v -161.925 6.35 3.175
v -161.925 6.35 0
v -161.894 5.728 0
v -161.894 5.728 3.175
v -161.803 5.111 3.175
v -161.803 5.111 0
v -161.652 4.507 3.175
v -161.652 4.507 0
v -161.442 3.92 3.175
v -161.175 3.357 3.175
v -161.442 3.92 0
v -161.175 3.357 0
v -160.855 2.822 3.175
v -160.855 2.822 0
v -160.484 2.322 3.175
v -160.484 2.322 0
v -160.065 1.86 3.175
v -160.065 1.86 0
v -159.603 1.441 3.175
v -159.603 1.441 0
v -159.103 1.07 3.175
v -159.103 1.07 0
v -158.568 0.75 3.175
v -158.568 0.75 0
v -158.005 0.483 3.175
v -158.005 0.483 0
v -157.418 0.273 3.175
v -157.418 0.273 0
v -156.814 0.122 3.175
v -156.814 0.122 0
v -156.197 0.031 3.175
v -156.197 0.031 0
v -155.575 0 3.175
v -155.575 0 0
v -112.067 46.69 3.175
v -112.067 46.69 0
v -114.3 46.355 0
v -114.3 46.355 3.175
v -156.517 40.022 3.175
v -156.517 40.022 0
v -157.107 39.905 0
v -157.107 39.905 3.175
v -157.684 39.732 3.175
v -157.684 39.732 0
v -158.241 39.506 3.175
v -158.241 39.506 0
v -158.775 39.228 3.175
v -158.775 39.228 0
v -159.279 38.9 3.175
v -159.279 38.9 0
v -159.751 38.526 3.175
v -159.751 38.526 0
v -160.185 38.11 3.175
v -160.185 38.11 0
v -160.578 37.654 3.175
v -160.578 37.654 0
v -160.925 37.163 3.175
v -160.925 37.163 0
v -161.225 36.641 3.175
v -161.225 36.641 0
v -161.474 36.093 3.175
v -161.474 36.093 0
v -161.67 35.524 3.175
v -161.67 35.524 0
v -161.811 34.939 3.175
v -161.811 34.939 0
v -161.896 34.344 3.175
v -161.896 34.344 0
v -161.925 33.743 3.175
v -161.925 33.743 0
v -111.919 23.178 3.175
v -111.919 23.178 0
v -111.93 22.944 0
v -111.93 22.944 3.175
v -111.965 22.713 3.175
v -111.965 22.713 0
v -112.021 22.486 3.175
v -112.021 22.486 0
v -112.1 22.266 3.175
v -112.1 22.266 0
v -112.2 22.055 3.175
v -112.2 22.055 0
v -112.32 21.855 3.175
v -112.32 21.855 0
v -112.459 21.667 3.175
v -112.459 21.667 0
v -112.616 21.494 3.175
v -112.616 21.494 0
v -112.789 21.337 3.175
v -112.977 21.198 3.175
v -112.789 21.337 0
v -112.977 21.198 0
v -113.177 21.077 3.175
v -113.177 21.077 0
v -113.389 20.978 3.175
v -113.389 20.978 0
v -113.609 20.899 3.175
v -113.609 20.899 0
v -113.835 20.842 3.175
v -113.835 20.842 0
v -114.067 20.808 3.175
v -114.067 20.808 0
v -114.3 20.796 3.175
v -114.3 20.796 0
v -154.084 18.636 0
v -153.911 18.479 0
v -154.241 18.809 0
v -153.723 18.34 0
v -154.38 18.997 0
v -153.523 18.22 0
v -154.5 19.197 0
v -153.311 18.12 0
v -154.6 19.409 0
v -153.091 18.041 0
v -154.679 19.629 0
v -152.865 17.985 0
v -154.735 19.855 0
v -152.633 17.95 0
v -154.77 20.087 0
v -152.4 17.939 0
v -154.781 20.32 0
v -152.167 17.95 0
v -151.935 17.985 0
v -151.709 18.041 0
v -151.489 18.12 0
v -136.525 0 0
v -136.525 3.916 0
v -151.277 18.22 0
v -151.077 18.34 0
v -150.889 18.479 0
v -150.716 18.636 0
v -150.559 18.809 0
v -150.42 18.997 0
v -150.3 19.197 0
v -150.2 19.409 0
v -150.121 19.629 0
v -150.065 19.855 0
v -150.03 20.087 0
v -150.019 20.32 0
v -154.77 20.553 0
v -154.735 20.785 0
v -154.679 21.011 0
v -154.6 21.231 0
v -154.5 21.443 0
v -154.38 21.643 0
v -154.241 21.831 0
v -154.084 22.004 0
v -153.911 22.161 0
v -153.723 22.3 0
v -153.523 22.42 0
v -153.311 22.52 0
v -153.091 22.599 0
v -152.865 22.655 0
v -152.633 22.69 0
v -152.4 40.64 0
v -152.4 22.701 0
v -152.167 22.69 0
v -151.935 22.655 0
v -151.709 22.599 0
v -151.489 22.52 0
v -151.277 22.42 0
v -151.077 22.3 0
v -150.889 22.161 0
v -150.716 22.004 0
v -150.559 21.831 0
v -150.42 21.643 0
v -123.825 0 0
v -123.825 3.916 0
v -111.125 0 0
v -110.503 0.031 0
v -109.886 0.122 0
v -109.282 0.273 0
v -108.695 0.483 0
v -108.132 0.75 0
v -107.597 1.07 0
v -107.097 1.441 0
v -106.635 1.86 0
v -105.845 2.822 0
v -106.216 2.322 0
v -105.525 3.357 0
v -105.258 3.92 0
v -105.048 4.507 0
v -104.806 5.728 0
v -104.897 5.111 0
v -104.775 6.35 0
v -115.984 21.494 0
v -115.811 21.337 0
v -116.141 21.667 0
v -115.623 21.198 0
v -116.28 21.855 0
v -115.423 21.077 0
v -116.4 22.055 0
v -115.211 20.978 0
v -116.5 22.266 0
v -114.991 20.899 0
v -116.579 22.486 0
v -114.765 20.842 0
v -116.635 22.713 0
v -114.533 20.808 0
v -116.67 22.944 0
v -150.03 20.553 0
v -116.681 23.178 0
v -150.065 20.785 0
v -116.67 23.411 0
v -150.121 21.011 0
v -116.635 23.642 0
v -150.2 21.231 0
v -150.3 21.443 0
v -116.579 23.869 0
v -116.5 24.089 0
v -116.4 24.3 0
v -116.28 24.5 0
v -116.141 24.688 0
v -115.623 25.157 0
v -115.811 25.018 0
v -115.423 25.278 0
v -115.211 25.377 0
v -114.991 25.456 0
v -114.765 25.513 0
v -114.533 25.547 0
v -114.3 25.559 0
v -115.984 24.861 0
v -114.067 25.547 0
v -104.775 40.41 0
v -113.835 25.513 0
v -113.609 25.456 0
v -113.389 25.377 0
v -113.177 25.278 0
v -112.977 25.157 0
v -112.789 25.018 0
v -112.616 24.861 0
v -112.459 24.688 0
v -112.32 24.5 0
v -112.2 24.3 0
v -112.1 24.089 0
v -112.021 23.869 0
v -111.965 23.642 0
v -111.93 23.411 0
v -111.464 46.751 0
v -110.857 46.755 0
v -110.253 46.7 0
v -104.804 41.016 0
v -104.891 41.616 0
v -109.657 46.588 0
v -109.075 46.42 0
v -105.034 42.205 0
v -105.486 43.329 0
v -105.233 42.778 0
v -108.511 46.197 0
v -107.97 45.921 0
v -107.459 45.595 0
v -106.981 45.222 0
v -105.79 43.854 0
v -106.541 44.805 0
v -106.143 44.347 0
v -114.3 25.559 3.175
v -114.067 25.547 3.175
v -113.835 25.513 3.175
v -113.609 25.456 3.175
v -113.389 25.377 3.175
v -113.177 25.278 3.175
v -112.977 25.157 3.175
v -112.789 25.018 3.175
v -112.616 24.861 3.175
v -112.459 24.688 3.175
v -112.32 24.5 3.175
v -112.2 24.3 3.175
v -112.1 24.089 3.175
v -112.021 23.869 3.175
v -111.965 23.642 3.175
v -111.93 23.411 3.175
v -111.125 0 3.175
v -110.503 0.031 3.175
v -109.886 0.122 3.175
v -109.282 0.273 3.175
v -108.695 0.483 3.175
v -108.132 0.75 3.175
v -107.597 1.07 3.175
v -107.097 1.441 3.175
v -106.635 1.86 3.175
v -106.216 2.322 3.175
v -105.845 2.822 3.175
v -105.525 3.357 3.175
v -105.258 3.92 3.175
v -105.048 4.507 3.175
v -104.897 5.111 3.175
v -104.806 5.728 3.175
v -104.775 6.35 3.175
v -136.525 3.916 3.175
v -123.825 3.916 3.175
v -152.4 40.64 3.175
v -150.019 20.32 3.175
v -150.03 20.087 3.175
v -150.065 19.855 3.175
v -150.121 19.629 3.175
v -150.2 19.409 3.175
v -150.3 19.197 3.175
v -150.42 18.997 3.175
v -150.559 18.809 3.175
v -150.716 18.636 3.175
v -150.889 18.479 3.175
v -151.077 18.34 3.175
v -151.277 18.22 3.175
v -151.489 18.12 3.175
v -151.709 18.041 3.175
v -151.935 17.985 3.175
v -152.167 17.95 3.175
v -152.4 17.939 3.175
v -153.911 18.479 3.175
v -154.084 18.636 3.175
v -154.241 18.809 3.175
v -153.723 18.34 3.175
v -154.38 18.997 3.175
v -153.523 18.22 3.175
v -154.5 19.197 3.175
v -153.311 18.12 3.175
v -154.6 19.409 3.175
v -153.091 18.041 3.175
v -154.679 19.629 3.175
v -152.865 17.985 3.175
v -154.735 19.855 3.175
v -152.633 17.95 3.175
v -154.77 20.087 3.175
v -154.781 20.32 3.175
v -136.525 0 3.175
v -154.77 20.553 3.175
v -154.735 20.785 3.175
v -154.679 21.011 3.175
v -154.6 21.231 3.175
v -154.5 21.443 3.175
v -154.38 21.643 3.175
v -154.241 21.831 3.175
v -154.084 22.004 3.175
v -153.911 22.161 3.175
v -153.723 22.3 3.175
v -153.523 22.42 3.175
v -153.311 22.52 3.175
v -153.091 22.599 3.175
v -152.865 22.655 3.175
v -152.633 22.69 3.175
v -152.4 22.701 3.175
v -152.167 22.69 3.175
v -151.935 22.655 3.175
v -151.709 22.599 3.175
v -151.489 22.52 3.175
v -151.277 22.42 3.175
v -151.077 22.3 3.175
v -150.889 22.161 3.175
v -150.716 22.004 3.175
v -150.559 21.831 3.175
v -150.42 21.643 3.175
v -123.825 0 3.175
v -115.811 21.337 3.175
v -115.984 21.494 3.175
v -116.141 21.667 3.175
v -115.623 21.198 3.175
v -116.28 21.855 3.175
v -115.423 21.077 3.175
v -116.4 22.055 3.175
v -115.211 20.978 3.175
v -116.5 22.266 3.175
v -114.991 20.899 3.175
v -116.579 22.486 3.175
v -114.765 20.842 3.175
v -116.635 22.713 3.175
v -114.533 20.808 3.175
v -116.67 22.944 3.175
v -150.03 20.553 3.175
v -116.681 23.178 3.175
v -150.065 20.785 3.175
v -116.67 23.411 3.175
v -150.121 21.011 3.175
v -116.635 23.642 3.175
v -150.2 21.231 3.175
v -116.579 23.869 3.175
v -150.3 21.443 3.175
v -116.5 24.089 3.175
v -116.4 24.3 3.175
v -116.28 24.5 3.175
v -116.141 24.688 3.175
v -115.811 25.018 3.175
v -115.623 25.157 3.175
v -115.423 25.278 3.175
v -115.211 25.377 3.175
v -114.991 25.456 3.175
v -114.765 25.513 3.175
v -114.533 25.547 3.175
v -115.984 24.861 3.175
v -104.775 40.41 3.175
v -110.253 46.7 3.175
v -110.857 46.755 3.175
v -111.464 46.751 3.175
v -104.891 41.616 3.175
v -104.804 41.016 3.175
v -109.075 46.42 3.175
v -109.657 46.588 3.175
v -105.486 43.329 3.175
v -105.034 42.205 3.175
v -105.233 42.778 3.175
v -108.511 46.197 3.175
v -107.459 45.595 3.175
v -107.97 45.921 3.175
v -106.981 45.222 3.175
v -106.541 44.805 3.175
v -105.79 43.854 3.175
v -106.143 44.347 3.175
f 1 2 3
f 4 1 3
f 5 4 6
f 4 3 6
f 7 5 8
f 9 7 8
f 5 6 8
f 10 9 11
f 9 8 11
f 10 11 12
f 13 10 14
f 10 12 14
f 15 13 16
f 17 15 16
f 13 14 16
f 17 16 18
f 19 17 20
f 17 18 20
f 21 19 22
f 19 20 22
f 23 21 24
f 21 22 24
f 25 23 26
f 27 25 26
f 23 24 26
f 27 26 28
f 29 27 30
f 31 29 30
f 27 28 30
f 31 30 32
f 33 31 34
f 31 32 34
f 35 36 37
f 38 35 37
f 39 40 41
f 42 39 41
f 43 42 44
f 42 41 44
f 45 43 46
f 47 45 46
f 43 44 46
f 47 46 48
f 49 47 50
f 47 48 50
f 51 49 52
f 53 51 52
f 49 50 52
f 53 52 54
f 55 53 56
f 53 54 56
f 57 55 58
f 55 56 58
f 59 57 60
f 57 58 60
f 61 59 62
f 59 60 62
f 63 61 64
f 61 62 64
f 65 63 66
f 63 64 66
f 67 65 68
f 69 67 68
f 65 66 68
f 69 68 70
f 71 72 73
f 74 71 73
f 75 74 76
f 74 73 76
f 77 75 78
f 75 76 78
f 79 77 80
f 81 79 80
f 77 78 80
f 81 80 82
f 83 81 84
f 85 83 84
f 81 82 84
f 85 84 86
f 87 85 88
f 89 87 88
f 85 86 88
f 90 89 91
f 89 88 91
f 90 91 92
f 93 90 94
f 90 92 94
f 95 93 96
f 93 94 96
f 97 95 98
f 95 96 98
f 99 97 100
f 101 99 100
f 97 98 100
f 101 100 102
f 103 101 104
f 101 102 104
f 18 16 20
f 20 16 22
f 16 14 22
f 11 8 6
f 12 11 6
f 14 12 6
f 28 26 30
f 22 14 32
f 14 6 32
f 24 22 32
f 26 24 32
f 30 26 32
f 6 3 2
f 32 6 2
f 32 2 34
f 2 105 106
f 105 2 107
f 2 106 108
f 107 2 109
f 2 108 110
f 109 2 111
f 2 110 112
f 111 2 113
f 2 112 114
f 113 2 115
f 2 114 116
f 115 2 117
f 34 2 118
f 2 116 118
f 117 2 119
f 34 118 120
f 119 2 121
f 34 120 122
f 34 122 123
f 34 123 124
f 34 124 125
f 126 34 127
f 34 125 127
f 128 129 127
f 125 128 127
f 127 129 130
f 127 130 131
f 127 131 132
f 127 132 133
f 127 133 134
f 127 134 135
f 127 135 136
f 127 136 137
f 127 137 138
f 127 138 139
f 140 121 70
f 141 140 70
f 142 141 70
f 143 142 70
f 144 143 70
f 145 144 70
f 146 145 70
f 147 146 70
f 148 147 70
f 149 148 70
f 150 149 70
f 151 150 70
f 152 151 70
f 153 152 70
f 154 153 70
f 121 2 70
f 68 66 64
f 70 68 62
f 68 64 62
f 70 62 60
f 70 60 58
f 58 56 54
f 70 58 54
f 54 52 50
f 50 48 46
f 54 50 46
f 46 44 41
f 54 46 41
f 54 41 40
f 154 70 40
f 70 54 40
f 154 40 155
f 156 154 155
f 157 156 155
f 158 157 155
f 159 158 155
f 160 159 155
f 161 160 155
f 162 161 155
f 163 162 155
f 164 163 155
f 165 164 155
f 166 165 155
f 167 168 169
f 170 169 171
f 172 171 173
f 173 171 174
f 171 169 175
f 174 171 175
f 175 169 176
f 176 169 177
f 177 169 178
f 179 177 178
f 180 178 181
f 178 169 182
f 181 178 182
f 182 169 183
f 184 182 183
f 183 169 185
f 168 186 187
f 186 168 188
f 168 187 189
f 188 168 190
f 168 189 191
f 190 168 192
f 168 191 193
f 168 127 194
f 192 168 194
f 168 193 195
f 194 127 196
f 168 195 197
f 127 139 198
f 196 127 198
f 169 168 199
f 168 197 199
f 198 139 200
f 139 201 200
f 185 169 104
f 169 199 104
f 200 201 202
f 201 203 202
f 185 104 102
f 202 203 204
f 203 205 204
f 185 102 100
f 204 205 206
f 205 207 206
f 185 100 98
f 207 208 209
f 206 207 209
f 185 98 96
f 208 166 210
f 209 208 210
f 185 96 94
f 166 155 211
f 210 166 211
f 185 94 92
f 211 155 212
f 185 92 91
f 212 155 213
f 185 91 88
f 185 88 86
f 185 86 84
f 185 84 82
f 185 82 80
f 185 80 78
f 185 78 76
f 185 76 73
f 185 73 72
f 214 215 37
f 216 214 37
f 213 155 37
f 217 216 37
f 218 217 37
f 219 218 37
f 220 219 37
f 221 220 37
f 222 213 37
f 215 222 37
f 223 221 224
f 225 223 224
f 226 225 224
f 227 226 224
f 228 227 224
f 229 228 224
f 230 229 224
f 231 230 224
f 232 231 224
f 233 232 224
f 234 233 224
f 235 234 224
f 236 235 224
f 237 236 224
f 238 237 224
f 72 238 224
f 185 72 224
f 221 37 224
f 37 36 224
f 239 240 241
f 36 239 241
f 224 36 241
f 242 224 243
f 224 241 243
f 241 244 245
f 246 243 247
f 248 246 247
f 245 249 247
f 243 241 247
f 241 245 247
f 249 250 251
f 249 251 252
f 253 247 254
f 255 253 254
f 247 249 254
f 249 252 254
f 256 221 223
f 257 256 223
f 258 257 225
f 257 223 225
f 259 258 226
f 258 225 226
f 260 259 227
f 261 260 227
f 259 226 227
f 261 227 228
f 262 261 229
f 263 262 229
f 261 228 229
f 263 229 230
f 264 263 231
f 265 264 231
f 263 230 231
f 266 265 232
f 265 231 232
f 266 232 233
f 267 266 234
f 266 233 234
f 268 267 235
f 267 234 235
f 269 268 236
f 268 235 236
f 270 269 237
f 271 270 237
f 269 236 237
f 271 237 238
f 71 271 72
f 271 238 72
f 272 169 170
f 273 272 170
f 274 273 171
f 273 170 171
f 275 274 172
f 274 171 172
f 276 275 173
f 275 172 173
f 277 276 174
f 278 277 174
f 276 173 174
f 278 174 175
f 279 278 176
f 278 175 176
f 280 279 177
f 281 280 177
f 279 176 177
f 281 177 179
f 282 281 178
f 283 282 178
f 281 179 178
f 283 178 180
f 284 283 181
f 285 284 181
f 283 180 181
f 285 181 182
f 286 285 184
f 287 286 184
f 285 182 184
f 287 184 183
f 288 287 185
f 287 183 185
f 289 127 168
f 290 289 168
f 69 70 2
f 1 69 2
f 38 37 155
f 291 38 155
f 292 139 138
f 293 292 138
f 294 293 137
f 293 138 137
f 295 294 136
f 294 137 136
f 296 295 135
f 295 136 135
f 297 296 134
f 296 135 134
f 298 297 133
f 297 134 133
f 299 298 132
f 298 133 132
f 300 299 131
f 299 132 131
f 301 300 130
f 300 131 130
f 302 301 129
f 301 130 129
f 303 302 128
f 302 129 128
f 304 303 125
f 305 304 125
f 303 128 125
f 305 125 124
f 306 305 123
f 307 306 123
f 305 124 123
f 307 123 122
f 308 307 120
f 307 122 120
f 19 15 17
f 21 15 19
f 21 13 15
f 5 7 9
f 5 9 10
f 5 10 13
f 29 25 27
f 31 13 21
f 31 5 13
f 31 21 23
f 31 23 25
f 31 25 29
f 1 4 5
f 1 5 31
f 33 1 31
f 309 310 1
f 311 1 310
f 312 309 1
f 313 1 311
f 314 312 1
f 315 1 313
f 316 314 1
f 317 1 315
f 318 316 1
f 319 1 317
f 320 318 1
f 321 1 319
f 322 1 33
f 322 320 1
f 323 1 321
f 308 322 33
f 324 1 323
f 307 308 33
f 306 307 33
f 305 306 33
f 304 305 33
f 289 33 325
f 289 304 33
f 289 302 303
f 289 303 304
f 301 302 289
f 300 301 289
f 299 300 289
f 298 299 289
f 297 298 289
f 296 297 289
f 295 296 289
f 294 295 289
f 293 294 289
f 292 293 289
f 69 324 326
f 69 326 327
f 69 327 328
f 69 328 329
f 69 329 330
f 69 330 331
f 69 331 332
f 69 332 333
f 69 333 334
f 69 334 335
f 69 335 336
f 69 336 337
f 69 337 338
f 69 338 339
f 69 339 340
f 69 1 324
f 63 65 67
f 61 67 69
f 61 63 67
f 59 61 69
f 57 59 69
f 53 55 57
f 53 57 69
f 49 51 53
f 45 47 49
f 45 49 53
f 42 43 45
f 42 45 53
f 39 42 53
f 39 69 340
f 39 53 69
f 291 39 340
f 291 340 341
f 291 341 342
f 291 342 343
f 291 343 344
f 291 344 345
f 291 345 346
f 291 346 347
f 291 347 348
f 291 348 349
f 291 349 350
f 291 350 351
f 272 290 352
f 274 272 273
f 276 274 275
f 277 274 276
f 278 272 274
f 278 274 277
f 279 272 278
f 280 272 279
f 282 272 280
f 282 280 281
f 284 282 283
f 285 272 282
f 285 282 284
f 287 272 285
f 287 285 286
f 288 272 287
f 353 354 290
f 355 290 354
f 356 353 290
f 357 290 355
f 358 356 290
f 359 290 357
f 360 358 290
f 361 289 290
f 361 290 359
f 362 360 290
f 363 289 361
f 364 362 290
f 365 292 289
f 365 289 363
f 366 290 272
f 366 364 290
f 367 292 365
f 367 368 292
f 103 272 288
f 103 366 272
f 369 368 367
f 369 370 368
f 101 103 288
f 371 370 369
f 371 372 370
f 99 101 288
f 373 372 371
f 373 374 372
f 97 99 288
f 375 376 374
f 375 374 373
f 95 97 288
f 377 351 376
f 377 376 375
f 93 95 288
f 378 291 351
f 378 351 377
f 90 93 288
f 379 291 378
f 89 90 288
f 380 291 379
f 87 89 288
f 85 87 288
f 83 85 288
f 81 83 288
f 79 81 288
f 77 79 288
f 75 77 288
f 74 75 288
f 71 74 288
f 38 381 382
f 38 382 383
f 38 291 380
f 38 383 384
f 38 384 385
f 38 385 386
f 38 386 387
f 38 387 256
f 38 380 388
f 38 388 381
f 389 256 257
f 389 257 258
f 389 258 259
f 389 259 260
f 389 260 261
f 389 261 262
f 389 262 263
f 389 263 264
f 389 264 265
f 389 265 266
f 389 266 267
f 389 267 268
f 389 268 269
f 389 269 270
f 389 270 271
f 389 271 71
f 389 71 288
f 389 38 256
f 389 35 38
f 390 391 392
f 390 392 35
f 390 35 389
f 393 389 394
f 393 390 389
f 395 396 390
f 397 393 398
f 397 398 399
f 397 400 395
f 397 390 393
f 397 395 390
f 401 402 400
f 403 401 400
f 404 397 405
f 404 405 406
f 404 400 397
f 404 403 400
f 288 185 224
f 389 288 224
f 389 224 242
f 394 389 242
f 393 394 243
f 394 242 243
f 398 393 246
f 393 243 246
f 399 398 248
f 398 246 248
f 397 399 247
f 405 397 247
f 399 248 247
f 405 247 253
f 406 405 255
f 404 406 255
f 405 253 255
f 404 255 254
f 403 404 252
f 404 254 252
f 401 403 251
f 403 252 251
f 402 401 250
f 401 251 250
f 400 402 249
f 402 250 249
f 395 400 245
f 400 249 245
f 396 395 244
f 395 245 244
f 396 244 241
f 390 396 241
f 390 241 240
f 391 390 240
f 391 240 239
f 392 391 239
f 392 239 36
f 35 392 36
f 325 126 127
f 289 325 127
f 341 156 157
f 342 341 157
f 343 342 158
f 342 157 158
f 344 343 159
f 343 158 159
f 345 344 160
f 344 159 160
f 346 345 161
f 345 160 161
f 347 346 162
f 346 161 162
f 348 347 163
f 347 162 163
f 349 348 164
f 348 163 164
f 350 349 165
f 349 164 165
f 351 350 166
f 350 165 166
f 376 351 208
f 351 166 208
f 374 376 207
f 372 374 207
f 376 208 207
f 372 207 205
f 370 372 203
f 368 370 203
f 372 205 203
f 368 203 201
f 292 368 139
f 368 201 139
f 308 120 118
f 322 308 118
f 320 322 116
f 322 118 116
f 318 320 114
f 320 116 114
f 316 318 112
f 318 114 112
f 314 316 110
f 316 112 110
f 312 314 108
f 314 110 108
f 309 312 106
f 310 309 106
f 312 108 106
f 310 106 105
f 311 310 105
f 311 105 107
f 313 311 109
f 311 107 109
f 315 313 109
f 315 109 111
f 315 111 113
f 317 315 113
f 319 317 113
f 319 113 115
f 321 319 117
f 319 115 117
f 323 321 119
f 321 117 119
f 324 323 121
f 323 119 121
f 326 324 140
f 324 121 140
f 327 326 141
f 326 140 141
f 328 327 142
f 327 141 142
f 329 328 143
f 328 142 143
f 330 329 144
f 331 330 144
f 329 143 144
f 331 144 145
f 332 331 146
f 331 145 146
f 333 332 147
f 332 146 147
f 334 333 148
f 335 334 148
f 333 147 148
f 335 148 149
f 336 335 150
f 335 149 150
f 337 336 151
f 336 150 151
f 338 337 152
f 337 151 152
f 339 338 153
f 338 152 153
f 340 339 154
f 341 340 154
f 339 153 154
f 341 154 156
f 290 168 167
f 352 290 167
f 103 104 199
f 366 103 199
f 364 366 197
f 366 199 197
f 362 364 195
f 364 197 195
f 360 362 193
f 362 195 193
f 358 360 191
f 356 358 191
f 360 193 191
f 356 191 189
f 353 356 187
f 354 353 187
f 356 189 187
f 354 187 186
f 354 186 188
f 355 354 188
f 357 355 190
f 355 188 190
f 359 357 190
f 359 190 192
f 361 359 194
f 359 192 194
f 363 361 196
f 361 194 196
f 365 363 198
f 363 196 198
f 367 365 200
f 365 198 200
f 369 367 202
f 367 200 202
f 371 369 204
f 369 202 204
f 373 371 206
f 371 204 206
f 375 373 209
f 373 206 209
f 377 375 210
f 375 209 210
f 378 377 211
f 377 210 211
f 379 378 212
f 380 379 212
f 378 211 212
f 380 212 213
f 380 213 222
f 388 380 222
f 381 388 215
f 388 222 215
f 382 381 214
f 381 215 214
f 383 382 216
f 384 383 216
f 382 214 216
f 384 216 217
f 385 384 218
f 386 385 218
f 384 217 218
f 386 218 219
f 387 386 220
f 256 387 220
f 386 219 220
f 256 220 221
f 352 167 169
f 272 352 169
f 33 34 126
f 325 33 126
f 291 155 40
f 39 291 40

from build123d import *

# Parameters (mm, degrees)
BOSS_EXTRUDE1_DEPTH = 3.175


with BuildPart() as part:
    # Sketch1 → Boss-Extrude1 (new body)
    with BuildSketch(Plane.XY):
        with BuildLine():
            Line((-152.4, 22.70125), (-152.4, 40.64))
            Line((-152.4, 40.64), (-156.516961876, 40.022455719))
            ThreePointArc((-156.516961876, 40.022455719), (-160.386650336, 37.886442621), (-161.925, 33.742709878))
            Line((-161.925, 33.742709878), (-161.925, 6.35))
            ThreePointArc((-161.925, 6.35), (-160.065128061, 1.859871939), (-155.575, 0))
            Line((-155.575, 0), (-152.4, 0))
            Line((-152.4, 0), (-152.4, 17.93875))
            ThreePointArc((-152.4, 17.93875), (-154.78125, 20.32), (-152.4, 22.70125))
        make_face()
        with BuildLine():
            Line((-123.825, 0), (-114.3, 0))
            Line((-114.3, 0), (-114.3, 20.79625))
            ThreePointArc((-114.3, 20.79625), (-116.68125, 23.1775), (-114.3, 25.55875))
            Line((-114.3, 25.55875), (-114.3, 46.355))
            Line((-114.3, 46.355), (-152.4, 40.64))
            Line((-152.4, 40.64), (-152.4, 22.70125))
            ThreePointArc((-152.4, 22.70125), (-150.716201977, 22.003798023), (-150.01875, 20.32))
            ThreePointArc((-150.01875, 20.32), (-150.716201977, 18.636201977), (-152.4, 17.93875))
            Line((-152.4, 17.93875), (-152.4, 0))
            Line((-152.4, 0), (-136.525, 0))
            Line((-136.525, 0), (-136.525, 3.915859715))
            Line((-136.525, 3.915859715), (-123.825, 3.915859715))
            Line((-123.825, 3.915859715), (-123.825, 0))
        make_face()
        with BuildLine():
            Line((-114.3, 20.79625), (-114.3, 0))
            Line((-114.3, 0), (-111.125, 0))
            ThreePointArc((-111.125, 0), (-106.634871939, 1.859871939), (-104.775, 6.35))
            Line((-104.775, 6.35), (-104.775, 40.410209878))
            ThreePointArc((-104.775, 40.410209878), (-106.981267257, 45.221860214), (-112.066961876, 46.689955719))
            Line((-112.066961876, 46.689955719), (-114.3, 46.355))
            Line((-114.3, 46.355), (-114.3, 25.55875))
            ThreePointArc((-114.3, 25.55875), (-112.616201977, 24.861298023), (-111.91875, 23.1775))
            ThreePointArc((-111.91875, 23.1775), (-112.616201977, 21.493701977), (-114.3, 20.79625))
        make_face()
    extrude(amount=BOSS_EXTRUDE1_DEPTH)


solid = part.part
